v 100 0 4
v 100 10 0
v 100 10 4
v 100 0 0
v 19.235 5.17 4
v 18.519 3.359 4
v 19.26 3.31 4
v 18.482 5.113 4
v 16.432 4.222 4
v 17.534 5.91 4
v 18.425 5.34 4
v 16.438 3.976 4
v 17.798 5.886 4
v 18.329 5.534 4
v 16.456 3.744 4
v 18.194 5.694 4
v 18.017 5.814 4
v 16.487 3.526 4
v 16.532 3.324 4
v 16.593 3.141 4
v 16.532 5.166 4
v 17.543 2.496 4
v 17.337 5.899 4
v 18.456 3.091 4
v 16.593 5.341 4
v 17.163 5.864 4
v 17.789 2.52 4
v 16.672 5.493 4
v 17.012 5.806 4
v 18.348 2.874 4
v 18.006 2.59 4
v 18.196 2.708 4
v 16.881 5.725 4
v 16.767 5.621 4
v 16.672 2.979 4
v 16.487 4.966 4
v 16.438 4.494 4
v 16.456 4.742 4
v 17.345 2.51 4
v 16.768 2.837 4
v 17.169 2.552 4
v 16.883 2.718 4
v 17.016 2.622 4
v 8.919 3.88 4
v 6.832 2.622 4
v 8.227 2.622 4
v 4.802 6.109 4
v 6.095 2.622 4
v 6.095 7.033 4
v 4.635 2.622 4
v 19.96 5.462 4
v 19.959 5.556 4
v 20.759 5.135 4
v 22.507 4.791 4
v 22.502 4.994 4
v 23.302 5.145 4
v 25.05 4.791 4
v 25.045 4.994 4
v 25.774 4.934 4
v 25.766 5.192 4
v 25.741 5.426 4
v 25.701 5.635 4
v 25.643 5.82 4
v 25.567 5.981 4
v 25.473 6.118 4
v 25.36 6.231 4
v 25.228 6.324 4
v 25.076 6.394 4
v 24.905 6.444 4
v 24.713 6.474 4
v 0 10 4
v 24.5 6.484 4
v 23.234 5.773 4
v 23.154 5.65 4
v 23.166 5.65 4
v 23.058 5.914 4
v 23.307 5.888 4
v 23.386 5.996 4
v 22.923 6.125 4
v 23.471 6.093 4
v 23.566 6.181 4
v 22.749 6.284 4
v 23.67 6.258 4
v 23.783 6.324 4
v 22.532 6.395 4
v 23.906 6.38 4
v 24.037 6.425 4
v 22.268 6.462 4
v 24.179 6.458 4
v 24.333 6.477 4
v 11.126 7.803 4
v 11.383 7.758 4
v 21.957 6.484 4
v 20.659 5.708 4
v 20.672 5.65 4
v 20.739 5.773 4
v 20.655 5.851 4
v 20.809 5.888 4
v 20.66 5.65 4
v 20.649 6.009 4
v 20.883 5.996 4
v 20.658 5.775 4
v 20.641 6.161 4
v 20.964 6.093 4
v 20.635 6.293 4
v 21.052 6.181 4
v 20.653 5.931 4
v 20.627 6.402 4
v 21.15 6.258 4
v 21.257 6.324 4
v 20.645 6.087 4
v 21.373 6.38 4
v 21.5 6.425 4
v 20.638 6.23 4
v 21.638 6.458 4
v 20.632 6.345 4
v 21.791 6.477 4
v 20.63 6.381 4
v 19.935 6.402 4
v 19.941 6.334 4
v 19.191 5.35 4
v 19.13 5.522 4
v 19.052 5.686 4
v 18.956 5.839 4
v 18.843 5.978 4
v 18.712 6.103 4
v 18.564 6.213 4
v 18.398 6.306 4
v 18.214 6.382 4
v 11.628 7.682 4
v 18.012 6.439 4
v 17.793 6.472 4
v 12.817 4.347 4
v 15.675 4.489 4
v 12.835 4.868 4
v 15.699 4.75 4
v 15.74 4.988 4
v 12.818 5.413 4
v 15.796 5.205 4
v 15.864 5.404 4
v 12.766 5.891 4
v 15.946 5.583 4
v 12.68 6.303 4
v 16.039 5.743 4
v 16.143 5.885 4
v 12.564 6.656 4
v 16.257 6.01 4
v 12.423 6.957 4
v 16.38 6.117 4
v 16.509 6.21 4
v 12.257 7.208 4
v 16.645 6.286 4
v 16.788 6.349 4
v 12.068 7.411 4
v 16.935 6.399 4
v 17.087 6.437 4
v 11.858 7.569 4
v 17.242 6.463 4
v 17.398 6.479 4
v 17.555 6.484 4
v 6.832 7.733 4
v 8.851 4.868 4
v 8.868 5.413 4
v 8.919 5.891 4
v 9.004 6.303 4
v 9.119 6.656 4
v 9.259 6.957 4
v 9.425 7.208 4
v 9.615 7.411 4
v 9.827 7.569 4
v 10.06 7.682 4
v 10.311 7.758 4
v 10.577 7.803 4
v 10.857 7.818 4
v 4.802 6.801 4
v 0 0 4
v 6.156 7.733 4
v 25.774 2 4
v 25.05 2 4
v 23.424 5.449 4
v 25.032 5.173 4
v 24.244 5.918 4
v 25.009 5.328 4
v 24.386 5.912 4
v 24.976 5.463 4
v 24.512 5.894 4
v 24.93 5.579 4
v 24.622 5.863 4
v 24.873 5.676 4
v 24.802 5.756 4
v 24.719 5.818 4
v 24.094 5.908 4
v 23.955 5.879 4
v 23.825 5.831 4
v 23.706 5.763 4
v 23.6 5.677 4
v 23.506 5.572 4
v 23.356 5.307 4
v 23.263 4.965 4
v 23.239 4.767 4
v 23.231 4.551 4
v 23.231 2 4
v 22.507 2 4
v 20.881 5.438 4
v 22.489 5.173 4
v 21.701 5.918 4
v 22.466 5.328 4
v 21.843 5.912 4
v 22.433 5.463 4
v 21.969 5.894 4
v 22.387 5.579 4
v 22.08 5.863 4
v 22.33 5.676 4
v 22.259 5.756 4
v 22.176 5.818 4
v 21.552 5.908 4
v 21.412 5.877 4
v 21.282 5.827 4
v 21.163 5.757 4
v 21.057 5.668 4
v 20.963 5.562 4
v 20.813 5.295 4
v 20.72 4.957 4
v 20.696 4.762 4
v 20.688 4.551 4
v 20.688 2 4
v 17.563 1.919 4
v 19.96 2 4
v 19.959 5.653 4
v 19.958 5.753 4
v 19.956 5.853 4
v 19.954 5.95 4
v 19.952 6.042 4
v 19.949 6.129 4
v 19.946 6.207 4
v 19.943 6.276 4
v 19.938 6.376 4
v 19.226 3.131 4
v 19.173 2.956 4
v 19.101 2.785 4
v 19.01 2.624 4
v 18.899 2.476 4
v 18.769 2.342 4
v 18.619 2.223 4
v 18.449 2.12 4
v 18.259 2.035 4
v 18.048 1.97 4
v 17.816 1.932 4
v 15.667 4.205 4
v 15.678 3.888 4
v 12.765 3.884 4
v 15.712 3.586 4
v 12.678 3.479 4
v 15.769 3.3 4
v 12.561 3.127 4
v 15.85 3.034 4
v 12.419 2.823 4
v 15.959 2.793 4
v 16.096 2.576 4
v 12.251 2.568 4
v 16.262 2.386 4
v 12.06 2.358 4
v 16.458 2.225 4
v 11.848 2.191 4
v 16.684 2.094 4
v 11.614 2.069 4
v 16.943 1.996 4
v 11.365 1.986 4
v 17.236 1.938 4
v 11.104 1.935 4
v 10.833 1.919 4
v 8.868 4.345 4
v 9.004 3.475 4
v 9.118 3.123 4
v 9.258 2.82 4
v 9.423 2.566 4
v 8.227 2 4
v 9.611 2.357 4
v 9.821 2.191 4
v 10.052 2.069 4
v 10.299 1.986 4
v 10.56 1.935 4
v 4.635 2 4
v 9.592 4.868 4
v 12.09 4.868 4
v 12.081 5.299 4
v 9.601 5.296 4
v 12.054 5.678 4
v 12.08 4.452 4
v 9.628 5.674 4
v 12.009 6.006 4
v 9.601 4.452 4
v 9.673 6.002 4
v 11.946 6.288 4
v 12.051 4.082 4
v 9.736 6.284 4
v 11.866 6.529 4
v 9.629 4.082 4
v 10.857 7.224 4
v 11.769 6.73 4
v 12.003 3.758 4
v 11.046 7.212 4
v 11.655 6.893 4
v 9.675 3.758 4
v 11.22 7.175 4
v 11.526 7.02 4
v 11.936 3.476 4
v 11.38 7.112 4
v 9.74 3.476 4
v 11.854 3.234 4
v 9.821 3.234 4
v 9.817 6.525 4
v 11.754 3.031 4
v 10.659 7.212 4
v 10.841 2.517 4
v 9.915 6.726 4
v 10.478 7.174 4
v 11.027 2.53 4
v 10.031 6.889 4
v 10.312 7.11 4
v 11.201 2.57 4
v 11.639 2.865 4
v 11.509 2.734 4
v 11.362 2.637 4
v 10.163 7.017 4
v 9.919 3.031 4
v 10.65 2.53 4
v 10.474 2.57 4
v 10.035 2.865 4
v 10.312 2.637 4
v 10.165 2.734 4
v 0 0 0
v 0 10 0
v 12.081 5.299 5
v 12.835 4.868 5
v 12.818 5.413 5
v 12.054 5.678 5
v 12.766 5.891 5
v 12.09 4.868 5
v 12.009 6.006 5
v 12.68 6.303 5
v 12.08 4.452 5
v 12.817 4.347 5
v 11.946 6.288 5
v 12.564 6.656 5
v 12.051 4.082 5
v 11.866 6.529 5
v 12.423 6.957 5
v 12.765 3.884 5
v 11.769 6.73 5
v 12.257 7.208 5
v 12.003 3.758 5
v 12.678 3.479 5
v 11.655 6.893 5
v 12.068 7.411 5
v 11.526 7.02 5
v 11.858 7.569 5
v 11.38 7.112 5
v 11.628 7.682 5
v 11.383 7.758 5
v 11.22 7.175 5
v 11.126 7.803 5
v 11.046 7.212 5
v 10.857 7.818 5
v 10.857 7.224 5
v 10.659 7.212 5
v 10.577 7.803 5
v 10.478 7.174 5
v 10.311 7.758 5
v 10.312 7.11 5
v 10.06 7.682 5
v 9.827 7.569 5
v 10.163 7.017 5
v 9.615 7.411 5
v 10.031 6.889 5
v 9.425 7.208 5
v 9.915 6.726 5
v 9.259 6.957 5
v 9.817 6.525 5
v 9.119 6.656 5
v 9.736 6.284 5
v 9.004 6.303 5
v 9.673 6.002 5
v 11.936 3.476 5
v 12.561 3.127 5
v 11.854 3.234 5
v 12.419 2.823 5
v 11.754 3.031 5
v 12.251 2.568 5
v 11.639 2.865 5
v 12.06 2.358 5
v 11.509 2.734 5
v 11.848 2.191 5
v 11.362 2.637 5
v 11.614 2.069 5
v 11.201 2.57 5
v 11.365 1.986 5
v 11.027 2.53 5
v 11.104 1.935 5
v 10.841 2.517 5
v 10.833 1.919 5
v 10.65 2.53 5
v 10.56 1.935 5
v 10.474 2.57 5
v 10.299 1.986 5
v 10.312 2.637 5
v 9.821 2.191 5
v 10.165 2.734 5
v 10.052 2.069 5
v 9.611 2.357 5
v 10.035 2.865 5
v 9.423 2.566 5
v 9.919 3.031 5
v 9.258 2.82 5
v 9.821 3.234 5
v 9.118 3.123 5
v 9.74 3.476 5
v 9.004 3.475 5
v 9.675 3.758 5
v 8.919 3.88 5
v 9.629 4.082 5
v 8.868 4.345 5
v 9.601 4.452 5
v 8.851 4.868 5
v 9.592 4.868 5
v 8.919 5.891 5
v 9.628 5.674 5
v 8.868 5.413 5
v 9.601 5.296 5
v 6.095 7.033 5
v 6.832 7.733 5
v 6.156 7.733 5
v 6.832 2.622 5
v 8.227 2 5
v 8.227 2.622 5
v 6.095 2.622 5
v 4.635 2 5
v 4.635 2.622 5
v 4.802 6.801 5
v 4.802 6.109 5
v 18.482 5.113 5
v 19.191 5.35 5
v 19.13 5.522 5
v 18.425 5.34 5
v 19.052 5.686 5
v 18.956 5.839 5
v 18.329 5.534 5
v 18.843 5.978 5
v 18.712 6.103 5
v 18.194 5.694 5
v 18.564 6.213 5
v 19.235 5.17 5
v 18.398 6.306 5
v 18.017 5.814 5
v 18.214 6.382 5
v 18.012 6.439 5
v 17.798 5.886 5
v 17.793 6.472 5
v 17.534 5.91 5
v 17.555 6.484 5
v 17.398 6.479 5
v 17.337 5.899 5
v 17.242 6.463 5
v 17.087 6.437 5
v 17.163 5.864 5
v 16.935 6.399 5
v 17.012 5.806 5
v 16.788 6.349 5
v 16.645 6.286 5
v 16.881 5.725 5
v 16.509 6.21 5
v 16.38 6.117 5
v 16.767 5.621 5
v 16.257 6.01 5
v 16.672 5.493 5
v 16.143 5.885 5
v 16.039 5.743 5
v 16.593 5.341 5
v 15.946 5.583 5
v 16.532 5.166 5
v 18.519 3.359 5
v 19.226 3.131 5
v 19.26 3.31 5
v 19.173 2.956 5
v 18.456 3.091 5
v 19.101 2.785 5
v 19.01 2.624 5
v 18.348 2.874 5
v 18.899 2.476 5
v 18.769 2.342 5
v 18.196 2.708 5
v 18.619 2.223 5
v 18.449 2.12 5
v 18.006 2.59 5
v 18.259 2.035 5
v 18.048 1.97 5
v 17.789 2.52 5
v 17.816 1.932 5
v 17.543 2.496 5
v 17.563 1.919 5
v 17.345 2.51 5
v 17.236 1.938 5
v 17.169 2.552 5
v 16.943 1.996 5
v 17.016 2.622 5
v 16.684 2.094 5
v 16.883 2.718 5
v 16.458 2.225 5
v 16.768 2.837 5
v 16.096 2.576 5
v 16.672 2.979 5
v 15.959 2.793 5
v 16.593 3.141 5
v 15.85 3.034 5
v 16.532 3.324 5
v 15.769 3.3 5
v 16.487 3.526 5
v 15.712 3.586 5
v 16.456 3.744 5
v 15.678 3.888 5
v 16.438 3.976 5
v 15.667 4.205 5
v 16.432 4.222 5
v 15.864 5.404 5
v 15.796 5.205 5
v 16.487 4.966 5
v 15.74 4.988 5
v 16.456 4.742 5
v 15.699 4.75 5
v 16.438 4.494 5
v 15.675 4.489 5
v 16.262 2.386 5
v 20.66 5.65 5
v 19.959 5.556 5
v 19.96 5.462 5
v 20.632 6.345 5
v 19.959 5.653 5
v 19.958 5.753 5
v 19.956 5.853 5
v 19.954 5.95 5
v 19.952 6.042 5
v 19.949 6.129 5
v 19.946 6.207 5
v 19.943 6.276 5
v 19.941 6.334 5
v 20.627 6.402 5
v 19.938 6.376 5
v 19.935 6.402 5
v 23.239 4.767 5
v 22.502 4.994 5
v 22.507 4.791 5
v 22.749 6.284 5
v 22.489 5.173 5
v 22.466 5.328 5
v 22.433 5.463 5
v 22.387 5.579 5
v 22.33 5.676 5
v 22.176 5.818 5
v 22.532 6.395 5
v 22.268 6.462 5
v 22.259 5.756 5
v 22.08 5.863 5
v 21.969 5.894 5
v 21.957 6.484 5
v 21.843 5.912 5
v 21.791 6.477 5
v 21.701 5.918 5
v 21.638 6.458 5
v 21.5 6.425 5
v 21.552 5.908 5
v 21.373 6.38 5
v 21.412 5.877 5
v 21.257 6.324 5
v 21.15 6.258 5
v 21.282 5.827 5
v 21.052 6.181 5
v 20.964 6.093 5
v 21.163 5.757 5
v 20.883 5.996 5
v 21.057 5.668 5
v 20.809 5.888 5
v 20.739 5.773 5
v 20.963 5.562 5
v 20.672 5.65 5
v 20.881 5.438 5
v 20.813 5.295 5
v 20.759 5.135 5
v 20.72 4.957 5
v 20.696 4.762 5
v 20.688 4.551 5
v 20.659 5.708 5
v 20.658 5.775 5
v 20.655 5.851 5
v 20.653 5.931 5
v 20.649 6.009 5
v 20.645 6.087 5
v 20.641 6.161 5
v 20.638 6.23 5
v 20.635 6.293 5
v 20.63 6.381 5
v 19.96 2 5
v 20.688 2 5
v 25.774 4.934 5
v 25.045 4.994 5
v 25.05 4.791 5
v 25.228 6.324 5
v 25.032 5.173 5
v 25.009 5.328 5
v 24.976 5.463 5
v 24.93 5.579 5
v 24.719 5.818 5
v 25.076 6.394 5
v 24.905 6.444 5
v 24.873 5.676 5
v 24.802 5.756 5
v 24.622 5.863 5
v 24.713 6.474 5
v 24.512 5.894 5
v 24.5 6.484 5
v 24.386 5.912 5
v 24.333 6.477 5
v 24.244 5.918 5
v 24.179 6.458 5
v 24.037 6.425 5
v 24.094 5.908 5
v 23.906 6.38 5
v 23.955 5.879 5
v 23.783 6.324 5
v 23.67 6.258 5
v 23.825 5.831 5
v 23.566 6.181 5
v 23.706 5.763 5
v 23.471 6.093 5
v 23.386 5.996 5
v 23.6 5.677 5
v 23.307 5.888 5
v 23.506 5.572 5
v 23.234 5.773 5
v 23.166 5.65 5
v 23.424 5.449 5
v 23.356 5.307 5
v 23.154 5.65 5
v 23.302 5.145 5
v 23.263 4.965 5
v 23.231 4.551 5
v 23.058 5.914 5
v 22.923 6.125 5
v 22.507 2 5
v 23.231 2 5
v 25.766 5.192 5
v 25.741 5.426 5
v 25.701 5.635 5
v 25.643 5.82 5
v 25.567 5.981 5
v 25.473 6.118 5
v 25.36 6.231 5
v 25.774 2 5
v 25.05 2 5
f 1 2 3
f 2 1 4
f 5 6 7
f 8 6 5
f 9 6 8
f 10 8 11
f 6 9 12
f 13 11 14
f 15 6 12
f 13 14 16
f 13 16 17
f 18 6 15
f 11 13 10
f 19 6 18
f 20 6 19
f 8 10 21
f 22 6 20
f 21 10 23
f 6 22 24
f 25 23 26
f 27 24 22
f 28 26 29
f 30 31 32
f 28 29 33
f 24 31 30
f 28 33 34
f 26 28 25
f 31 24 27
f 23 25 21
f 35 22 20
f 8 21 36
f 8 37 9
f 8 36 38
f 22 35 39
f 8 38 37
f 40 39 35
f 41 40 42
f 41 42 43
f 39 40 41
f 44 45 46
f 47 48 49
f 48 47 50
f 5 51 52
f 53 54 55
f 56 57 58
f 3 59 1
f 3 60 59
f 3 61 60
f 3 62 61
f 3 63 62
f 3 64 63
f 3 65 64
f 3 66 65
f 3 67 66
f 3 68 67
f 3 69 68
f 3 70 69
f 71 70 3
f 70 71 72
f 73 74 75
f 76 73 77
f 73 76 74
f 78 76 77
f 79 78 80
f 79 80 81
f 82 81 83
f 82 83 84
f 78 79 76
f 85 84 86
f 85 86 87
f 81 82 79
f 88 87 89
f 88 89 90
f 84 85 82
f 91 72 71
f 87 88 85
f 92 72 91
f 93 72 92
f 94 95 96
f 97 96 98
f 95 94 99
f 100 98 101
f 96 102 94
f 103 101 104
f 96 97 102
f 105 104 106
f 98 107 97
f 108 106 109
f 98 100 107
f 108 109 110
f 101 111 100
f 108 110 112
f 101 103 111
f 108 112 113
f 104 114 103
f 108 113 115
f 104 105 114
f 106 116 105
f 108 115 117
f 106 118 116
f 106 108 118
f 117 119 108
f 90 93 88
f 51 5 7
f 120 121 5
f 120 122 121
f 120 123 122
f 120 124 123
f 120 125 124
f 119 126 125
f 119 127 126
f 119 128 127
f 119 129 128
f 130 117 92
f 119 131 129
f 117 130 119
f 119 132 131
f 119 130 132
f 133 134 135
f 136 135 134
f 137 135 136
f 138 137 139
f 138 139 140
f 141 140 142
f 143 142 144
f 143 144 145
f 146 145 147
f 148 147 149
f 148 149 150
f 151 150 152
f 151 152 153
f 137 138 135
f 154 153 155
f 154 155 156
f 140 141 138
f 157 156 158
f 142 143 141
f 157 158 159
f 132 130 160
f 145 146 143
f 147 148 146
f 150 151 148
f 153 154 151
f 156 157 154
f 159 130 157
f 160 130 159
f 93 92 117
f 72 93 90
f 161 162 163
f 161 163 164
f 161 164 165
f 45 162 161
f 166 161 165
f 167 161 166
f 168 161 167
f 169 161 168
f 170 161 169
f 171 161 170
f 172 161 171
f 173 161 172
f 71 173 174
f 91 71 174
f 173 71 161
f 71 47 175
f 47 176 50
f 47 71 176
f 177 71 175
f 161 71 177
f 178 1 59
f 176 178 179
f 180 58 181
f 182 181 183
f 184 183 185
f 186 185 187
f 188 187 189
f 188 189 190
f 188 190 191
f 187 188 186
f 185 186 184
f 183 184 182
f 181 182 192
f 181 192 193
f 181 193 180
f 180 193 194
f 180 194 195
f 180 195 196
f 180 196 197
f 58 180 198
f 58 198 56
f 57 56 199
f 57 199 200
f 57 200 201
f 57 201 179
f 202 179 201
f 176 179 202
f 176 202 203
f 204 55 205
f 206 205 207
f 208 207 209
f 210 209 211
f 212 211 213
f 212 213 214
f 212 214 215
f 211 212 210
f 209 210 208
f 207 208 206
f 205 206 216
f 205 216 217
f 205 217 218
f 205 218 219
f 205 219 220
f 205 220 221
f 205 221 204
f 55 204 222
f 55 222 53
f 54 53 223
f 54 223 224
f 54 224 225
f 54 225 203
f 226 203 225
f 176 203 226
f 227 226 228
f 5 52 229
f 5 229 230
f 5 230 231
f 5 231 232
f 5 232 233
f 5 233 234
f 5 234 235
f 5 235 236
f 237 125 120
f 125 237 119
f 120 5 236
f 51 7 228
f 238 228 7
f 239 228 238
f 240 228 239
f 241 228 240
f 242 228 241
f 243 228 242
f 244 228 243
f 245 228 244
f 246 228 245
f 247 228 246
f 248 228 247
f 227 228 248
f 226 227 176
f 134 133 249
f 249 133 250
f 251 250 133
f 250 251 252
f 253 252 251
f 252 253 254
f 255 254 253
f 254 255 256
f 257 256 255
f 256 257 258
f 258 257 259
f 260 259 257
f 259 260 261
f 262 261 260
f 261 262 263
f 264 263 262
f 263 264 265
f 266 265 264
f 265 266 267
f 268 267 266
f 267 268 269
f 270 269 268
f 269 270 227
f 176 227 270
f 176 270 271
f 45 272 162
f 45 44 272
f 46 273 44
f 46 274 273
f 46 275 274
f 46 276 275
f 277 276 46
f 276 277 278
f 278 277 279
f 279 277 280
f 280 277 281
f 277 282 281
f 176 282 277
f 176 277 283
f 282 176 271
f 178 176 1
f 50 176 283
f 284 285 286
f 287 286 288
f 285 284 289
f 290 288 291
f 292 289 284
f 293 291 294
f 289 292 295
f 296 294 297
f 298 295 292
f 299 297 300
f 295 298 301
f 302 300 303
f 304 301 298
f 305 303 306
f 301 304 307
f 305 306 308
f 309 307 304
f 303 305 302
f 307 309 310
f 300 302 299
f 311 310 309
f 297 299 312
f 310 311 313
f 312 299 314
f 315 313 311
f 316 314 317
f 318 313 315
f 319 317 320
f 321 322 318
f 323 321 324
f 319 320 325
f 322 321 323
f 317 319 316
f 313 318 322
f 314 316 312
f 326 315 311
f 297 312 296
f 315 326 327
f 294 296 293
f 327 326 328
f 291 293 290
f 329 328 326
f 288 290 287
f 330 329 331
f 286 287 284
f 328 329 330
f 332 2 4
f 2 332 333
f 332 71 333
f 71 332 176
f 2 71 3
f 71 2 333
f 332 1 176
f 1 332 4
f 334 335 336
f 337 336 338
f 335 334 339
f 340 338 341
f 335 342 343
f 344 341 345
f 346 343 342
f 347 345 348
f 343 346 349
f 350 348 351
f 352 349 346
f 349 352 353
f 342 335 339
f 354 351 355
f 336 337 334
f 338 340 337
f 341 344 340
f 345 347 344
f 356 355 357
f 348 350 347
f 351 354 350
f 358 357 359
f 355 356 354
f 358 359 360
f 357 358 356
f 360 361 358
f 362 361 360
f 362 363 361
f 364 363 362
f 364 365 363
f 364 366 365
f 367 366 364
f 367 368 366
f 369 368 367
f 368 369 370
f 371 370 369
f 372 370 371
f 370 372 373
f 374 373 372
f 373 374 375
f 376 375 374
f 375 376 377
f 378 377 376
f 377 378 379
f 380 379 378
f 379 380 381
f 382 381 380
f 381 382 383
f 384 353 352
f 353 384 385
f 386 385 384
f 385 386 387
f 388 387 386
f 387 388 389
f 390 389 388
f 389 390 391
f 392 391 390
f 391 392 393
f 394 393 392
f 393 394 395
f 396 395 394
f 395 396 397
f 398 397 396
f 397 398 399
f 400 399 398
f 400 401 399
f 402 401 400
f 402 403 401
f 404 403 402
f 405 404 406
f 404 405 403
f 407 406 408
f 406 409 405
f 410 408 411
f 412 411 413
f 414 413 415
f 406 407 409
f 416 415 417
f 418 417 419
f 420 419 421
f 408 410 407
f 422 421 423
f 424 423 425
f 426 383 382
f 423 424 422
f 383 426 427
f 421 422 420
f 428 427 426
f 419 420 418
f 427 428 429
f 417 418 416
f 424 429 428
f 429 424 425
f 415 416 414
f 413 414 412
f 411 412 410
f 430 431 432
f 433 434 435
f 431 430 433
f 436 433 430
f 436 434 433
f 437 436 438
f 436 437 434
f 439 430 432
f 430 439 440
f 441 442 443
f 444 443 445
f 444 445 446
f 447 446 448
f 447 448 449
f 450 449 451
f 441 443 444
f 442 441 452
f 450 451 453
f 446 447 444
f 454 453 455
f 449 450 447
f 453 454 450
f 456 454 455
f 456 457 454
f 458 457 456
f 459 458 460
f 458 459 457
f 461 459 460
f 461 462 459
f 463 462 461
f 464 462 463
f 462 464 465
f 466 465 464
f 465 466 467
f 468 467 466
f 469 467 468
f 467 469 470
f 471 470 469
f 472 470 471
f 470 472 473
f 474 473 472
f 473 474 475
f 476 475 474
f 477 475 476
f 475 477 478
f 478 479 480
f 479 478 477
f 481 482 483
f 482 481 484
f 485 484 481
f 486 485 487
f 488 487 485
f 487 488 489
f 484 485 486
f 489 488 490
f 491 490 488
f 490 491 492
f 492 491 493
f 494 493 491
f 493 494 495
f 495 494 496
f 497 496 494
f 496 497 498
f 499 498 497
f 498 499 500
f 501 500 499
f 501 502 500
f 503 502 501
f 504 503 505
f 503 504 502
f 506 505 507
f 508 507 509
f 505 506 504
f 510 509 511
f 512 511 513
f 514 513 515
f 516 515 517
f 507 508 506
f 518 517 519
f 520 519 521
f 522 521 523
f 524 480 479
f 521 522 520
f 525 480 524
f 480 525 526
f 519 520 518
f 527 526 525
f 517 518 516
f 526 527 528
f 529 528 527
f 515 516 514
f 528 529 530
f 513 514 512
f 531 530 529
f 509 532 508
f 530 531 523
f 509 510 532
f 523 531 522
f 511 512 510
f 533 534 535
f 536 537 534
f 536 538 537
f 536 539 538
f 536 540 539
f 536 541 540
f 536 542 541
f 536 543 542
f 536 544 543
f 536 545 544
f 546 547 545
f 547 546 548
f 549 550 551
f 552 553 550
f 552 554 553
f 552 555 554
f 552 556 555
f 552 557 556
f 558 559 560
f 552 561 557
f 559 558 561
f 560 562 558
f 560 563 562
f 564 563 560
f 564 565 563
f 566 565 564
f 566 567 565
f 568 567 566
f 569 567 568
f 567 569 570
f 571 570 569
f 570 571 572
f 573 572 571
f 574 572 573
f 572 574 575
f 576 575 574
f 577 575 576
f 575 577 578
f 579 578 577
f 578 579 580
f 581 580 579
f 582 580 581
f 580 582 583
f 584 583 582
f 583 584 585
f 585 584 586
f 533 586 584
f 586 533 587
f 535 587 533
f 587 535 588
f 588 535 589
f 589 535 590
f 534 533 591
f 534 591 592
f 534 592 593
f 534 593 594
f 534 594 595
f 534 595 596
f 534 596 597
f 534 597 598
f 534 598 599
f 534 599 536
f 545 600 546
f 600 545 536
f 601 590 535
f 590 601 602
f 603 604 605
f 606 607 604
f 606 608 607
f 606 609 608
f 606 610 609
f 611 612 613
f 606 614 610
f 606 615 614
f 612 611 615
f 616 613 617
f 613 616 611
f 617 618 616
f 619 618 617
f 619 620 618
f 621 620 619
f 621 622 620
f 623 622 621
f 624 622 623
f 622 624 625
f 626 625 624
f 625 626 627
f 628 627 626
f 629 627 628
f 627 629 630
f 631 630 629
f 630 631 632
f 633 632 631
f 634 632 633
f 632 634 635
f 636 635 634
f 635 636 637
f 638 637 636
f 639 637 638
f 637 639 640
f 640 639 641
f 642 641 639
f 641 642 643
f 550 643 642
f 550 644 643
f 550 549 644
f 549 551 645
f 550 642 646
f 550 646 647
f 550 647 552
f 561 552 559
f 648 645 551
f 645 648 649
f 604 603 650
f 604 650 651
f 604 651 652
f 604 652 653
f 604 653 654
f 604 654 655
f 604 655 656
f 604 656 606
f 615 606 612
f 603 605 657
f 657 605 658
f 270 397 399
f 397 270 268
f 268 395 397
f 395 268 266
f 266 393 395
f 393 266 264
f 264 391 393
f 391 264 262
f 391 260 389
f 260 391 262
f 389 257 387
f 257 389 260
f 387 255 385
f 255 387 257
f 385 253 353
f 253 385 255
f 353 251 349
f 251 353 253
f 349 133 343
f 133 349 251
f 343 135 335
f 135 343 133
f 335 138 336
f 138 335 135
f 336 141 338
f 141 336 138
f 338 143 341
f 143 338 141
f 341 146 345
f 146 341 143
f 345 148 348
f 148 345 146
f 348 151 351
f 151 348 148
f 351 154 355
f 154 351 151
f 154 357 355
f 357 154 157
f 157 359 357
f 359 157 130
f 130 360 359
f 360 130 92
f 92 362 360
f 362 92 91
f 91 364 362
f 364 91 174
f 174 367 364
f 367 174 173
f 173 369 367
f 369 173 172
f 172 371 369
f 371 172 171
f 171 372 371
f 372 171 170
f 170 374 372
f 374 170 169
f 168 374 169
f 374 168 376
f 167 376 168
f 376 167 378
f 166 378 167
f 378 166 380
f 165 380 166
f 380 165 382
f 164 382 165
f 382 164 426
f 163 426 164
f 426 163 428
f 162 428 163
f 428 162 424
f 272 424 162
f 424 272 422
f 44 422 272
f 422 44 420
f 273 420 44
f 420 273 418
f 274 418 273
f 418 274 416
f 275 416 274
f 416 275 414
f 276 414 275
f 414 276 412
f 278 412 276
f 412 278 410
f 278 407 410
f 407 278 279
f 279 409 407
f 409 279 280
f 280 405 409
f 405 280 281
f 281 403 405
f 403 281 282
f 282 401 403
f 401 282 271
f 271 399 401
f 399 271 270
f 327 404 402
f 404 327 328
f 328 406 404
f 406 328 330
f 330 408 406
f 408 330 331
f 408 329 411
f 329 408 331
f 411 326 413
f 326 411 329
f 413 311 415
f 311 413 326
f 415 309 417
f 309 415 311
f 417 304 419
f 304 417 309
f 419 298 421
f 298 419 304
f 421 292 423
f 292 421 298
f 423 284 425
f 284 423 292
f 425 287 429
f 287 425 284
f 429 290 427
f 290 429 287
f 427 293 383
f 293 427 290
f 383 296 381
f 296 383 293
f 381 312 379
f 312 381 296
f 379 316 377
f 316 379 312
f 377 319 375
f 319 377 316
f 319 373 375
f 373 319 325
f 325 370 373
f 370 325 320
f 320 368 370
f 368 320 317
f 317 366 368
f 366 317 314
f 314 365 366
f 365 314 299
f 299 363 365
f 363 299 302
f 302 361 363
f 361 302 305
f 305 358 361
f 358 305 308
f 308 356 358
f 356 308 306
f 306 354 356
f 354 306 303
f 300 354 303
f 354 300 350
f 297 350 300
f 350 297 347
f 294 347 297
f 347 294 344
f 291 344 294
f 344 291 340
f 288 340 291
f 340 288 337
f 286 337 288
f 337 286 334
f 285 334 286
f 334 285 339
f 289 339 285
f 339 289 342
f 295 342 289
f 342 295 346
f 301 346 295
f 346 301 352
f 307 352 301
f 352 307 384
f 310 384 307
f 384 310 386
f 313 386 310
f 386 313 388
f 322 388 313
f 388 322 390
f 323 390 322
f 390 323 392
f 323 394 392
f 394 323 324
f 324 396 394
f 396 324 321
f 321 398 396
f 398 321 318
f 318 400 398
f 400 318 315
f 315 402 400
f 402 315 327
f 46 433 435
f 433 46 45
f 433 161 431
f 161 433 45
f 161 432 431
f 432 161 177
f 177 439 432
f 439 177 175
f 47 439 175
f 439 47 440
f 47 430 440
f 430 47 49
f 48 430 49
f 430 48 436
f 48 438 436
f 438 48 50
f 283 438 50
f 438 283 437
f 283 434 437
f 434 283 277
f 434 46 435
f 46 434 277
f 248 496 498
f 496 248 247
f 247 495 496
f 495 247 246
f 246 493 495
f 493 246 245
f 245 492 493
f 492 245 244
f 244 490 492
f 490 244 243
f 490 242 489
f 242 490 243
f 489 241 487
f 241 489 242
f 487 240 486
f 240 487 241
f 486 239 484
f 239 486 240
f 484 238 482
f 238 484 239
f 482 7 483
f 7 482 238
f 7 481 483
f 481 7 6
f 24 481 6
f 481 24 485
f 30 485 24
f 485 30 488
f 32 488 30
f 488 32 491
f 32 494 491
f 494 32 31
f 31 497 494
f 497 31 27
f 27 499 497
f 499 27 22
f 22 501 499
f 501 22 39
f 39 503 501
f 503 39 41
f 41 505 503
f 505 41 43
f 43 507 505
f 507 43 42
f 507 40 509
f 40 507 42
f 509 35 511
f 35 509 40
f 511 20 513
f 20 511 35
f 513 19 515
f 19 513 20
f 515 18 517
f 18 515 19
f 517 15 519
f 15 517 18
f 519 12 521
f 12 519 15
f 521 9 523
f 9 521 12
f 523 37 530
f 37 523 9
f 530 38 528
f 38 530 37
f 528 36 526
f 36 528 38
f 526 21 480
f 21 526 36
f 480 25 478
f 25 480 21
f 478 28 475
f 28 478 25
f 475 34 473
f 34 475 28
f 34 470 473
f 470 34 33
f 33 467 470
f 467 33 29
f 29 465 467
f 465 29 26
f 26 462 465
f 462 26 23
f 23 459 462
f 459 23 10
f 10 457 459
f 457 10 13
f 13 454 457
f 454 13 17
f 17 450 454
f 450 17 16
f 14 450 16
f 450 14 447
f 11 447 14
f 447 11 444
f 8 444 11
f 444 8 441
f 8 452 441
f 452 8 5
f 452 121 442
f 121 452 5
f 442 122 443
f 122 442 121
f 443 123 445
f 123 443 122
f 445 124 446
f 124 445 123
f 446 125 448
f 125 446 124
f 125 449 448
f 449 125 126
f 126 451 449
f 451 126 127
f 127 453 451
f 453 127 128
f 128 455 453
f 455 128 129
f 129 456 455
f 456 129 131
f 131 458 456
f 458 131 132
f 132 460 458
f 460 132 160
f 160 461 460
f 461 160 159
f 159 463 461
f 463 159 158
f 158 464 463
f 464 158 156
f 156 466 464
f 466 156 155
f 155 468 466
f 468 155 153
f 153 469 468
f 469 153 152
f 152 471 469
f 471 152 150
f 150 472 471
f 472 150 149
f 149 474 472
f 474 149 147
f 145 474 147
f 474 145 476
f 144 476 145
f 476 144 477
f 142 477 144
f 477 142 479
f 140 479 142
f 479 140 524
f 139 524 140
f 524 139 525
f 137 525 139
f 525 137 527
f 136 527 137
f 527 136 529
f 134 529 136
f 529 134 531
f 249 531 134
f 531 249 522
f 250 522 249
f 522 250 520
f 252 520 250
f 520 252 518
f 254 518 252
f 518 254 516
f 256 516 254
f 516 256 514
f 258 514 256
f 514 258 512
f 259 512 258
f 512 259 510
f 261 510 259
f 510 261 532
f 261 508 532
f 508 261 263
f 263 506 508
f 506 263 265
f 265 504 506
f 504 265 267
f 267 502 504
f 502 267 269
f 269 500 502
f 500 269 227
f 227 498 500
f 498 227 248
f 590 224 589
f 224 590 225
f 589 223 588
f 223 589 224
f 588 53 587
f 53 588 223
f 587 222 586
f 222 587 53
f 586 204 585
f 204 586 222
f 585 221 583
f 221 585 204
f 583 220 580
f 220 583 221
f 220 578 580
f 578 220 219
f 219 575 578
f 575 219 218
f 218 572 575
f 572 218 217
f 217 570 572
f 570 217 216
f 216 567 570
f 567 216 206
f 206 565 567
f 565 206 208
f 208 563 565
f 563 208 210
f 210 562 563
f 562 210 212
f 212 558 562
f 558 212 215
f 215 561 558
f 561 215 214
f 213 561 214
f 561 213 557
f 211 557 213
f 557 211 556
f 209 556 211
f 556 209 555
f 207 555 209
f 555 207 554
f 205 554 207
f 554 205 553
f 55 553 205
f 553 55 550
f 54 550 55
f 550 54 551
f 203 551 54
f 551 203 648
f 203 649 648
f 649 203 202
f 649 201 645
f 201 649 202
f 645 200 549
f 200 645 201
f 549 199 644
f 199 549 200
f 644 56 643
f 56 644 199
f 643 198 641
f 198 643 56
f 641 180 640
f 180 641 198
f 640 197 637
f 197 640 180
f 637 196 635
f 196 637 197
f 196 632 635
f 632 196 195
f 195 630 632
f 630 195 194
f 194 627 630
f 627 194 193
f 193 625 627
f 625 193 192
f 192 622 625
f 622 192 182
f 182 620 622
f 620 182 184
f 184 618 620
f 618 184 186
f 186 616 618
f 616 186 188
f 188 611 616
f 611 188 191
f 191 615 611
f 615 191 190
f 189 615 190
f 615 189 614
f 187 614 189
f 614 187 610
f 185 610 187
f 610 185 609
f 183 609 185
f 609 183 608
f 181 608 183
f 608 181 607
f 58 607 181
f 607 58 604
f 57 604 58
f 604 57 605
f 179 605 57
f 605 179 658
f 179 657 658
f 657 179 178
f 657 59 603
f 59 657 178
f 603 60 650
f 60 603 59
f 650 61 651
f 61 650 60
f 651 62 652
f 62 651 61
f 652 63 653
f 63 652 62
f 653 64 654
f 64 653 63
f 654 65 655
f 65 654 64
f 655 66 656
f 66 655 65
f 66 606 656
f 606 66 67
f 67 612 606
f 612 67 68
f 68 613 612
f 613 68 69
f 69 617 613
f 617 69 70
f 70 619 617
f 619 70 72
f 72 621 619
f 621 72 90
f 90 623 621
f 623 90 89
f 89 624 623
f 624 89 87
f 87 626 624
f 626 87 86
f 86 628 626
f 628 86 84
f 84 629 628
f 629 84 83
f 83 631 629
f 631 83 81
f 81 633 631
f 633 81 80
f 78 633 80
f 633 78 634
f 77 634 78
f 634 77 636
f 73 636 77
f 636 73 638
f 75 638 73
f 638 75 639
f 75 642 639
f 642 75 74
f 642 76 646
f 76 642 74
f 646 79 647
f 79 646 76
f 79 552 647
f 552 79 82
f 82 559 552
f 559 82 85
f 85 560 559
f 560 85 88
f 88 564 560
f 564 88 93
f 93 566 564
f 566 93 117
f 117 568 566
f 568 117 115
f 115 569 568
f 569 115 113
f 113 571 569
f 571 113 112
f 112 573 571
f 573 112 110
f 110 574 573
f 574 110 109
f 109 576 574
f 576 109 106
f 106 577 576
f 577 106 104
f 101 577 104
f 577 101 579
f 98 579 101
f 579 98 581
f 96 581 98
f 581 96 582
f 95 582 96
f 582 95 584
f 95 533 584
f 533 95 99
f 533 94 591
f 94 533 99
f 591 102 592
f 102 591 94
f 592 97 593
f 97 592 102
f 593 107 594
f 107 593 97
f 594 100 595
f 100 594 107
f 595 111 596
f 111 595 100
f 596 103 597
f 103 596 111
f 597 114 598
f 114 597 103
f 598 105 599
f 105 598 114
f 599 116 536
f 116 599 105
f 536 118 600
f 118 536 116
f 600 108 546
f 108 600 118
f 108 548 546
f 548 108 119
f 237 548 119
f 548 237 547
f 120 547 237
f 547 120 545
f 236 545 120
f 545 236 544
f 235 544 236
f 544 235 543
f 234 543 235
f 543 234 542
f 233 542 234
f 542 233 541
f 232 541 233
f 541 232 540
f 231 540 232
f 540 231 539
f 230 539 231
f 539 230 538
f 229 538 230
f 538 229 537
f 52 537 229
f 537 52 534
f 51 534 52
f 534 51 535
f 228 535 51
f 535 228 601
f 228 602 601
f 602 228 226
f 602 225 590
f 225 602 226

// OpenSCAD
length = 100;
thickness = 4;
width = 10;

cube([length, width, thickness]);
translate([thickness, 2, thickness])
{
    linear_extrude(height = 1)
    {
        text("10 cm", font = "Liberation Sans", size = 6, direction = "ltr", spacing = 1 );
    }
}
